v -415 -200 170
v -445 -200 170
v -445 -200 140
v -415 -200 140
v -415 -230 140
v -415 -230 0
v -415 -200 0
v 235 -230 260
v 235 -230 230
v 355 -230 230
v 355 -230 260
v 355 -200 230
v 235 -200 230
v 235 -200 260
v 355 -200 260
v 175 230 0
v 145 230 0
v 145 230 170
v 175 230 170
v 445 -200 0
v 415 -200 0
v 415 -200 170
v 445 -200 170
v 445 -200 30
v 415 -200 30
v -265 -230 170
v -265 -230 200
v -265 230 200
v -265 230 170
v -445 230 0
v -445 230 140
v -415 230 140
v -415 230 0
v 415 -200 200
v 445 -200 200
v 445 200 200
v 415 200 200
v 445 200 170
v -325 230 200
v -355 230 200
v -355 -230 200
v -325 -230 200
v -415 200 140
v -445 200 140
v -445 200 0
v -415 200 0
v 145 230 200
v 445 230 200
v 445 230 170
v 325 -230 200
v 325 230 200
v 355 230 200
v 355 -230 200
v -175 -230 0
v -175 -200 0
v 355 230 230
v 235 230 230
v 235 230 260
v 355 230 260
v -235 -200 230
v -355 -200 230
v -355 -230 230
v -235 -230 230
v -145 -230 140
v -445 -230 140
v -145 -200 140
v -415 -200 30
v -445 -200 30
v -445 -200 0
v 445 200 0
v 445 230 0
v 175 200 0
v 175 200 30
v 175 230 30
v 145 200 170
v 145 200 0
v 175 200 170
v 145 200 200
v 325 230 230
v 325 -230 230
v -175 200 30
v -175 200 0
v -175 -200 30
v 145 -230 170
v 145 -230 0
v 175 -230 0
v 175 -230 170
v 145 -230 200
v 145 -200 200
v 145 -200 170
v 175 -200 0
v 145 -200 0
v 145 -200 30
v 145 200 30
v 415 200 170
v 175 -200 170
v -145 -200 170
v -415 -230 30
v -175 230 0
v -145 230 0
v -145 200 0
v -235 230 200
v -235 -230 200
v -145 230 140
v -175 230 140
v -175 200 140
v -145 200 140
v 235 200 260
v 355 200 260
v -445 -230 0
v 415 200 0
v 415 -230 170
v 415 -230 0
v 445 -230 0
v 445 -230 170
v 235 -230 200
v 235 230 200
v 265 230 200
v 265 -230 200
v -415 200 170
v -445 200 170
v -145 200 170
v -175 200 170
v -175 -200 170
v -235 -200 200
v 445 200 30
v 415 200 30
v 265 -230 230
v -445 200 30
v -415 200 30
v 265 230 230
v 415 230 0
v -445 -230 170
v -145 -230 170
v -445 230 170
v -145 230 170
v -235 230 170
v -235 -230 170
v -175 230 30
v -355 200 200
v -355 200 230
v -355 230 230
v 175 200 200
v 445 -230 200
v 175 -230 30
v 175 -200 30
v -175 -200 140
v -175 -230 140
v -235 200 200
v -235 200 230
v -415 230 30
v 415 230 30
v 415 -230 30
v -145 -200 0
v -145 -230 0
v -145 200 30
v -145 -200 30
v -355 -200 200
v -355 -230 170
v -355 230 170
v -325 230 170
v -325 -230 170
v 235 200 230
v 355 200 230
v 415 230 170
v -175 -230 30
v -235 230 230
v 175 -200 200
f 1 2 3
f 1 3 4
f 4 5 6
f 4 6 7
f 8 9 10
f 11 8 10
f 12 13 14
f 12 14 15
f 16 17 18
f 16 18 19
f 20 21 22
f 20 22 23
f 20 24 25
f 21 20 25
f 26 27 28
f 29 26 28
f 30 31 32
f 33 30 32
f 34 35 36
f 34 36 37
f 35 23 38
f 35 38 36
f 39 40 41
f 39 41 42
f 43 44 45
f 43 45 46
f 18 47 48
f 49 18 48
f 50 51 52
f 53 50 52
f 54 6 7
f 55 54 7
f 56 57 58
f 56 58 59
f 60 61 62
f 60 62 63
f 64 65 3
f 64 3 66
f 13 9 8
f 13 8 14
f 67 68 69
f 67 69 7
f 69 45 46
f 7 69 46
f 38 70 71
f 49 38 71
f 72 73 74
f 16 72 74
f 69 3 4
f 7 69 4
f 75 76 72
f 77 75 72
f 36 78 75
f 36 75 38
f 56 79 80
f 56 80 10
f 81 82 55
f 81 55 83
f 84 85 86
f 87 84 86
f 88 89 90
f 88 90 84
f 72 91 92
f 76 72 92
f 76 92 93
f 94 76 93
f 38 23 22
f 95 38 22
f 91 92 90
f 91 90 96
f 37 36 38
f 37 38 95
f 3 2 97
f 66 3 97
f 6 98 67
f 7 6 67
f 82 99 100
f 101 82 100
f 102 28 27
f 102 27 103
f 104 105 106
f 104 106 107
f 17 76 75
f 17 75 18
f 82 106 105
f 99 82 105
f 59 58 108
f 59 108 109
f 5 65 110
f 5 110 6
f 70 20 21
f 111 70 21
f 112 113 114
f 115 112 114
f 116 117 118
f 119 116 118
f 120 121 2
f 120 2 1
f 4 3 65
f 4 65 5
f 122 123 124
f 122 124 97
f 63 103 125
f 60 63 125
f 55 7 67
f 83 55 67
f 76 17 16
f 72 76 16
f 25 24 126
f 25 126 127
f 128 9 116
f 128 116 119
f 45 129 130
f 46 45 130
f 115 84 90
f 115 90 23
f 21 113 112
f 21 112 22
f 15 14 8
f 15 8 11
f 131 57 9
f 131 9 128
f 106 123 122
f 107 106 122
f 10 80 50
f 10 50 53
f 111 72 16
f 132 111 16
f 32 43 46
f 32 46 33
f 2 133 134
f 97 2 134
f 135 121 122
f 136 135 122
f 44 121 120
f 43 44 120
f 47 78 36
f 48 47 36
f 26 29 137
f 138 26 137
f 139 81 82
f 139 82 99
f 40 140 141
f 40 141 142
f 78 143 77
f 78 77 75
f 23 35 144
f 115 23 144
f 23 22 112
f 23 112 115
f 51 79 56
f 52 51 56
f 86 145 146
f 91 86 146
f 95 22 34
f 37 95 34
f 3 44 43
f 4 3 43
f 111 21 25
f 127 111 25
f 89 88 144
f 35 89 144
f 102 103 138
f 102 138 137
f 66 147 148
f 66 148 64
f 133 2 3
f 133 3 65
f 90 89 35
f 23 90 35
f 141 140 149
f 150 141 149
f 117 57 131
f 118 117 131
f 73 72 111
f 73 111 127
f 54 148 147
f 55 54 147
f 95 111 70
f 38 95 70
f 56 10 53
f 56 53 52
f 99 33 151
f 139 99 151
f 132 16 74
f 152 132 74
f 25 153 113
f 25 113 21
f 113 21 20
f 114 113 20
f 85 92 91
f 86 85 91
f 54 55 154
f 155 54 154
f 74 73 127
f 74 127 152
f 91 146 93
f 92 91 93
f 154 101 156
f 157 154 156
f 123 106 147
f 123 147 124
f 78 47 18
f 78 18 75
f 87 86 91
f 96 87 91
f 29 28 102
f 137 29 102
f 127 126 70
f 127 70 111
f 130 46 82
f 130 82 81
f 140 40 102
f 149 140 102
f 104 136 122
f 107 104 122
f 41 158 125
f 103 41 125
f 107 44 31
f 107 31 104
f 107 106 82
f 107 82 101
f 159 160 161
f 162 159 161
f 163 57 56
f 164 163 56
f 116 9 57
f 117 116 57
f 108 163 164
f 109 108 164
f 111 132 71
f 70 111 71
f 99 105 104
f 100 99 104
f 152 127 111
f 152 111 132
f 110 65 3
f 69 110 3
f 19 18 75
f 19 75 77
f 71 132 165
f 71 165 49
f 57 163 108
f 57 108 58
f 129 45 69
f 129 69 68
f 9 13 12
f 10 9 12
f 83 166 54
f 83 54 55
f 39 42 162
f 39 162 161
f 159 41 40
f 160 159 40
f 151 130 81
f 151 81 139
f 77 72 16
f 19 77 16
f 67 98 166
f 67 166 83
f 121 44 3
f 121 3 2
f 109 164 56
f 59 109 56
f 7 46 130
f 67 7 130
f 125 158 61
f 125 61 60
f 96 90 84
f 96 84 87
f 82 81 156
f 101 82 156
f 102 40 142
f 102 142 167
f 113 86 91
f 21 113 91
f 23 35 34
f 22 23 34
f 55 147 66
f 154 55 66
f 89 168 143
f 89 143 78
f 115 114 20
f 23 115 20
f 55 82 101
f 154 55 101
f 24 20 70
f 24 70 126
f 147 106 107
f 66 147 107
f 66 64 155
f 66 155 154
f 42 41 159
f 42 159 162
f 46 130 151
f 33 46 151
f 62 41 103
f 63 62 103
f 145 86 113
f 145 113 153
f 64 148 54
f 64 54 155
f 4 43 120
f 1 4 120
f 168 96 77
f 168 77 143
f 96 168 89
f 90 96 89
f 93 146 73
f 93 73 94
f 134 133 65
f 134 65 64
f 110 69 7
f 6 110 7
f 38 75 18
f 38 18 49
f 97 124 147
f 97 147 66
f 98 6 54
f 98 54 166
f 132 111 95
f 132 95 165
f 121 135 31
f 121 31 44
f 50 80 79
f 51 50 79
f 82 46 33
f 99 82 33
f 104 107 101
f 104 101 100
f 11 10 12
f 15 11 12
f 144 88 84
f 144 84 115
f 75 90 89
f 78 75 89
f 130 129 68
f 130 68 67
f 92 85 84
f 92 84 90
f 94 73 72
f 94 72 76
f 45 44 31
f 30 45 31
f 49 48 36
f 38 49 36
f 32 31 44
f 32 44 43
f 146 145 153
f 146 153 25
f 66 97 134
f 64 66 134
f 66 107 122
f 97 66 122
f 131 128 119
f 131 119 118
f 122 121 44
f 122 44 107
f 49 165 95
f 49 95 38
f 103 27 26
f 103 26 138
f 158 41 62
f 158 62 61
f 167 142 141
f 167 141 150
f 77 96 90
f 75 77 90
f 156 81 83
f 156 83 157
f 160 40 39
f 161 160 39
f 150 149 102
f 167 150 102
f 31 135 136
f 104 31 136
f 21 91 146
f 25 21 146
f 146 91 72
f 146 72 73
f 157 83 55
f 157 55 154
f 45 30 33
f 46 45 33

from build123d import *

# Parameters (mm, degrees)
F1_W      = 30
F1_H      = 460
F2_DEPTH  = 30
F4_W      = 300
F4_H      = 30
F5_DEPTH  = 30
F6_W      = 30
F6_H      = 30
F7_DEPTH  = 140
F8_W      = 30
F8_H      = 30
F9_DEPTH  = 240
F10_W     = 30
F10_H     = 30
F11_DEPTH = 400
F12_W     = 120
F12_H     = 30
F13_DEPTH = 30
F14_W     = 300
F14_H     = 30
F15_DEPTH = 30
F16_W     = 30
F16_H     = 30
F17_DEPTH = 170
F18_W     = 30
F18_H     = 30
F19_DEPTH = 240
F20_W     = 30
F20_H     = 30
F21_DEPTH = 400
F22_W     = 120
F22_H     = 30
F23_DEPTH = 30


with BuildPart() as f2:
    # F1 (on offset) → F2 (new body)
    with BuildSketch(Plane.XY.offset(200)):
        with Locations((-250, 0)):
            Rectangle(F1_W, F1_H)
    extrude(amount=-F2_DEPTH)


with BuildPart() as f2b:
    # F1 (on offset) → F2, piece 2 (new body)
    with BuildSketch(Plane.XY.offset(200)):
        with Locations((-340, 0)):
            Rectangle(F1_W, F1_H)
    extrude(amount=-F2_DEPTH)


with BuildPart() as f2c:
    # F1 (on offset) → F2, piece 3 (new body)
    with BuildSketch(Plane.XY.offset(200)):
        with Locations((250, 0)):
            Rectangle(F1_W, F1_H)
    extrude(amount=-F2_DEPTH)


with BuildPart() as f2d:
    # F1 (on offset) → F2, piece 4 (new body)
    with BuildSketch(Plane.XY.offset(200)):
        with Locations((340, 0)):
            Rectangle(F1_W, F1_H)
    extrude(amount=-F2_DEPTH)


with BuildPart() as f2c_1:
    # F3: moved
    add(f2c.part.moved(Location((0, 0, 30))))


with BuildPart() as f2d_1:
    # F3: moved
    add(f2d.part.moved(Location((0, 0, 30))))


with BuildPart() as f5:
    # F4 (on face) → F5 (new body)
    with BuildSketch(Plane(origin=(0, 0, 170), x_dir=(1, 0, 0), z_dir=(0, 0, -1))):
        with Locations((-295, 215)):
            Rectangle(F4_W, F4_H)
    extrude(amount=F5_DEPTH)


with BuildPart() as f5b:
    # F4 (on face) → F5, piece 2 (new body)
    with BuildSketch(Plane(origin=(0, 0, 170), x_dir=(1, 0, 0), z_dir=(0, 0, -1))):
        with Locations((-295, -215)):
            Rectangle(F4_W, F4_H)
    extrude(amount=F5_DEPTH)


with BuildPart() as f7:
    # F6 (on Top) → F7 (new body, through all)
    with BuildSketch(Plane.XY):
        with Locations((-160, -215)):
            Rectangle(F6_W, F6_H)
    extrude(amount=F7_DEPTH)


with BuildPart() as f7b:
    # F6 (on Top) → F7, piece 2 (new body, through all)
    with BuildSketch(Plane.XY):
        with Locations((-160, 215)):
            Rectangle(F6_W, F6_H)
    extrude(amount=F7_DEPTH)


with BuildPart() as f7c:
    # F6 (on Top) → F7, piece 3 (new body, through all)
    with BuildSketch(Plane.XY):
        with Locations((-430, -215)):
            Rectangle(F6_W, F6_H)
    extrude(amount=F7_DEPTH)


with BuildPart() as f7d:
    # F6 (on Top) → F7, piece 4 (new body, through all)
    with BuildSketch(Plane.XY):
        with Locations((-430, 215)):
            Rectangle(F6_W, F6_H)
    extrude(amount=F7_DEPTH)


with BuildPart() as f9:
    # F8 (on face) → F9 (new body, through all)
    with BuildSketch(Plane.YZ.offset(-415)):
        with Locations((-215, 15)):
            Rectangle(F8_W, F8_H)
    extrude(amount=F9_DEPTH)


with BuildPart() as f9b:
    # F8 (on face) → F9, piece 2 (new body, through all)
    with BuildSketch(Plane.YZ.offset(-415)):
        with Locations((215, 15)):
            Rectangle(F8_W, F8_H)
    extrude(amount=F9_DEPTH)


with BuildPart() as f11:
    # F10 (on face) → F11 (new body, through all)
    with BuildSketch(Plane.XZ.offset(-200)):
        with Locations((-430, 15)):
            Rectangle(F10_W, F10_H)
    extrude(amount=F11_DEPTH)


with BuildPart() as f11b:
    # F10 (on face) → F11, piece 2 (new body, through all)
    with BuildSketch(Plane.XZ.offset(-200)):
        with Locations((-160, 15)):
            Rectangle(F10_W, F10_H)
    extrude(amount=F11_DEPTH)


with BuildPart() as f11c:
    # F10 (on face) → F11, piece 3 (new body, through all)
    with BuildSketch(Plane.XZ.offset(-200)):
        with Locations((-430, 155)):
            Rectangle(F10_W, F10_H)
    extrude(amount=F11_DEPTH)


with BuildPart() as f11d:
    # F10 (on face) → F11, piece 4 (new body, through all)
    with BuildSketch(Plane.XZ.offset(-200)):
        with Locations((-160, 155)):
            Rectangle(F10_W, F10_H)
    extrude(amount=F11_DEPTH)


with BuildPart() as f13:
    # F12 (on face) → F13 (new body)
    with BuildSketch(Plane.XY.offset(200)):
        with Locations((-295, -215)):
            Rectangle(F12_W, F12_H)
    extrude(amount=F13_DEPTH)


with BuildPart() as f13b:
    # F12 (on face) → F13, piece 2 (new body)
    with BuildSketch(Plane.XY.offset(200)):
        with Locations((-295, 215)):
            Rectangle(F12_W, F12_H)
    extrude(amount=F13_DEPTH)


with BuildPart() as f15:
    # F14 (on face) → F15 (new body)
    with BuildSketch(Plane(origin=(0, 0, 200), x_dir=(1, 0, 0), z_dir=(0, 0, -1))):
        with Locations((295, 215)):
            Rectangle(F14_W, F14_H)
    extrude(amount=F15_DEPTH)


with BuildPart() as f15b:
    # F14 (on face) → F15, piece 2 (new body)
    with BuildSketch(Plane(origin=(0, 0, 200), x_dir=(1, 0, 0), z_dir=(0, 0, -1))):
        with Locations((295, -215)):
            Rectangle(F14_W, F14_H)
    extrude(amount=F15_DEPTH)


with BuildPart() as f17:
    # F16 (on Top) → F17 (new body, through all)
    with BuildSketch(Plane.XY):
        with Locations((160, -215)):
            Rectangle(F16_W, F16_H)
    extrude(amount=F17_DEPTH)


with BuildPart() as f17b:
    # F16 (on Top) → F17, piece 2 (new body, through all)
    with BuildSketch(Plane.XY):
        with Locations((430, -215)):
            Rectangle(F16_W, F16_H)
    extrude(amount=F17_DEPTH)


with BuildPart() as f17c:
    # F16 (on Top) → F17, piece 3 (new body, through all)
    with BuildSketch(Plane.XY):
        with Locations((430, 215)):
            Rectangle(F16_W, F16_H)
    extrude(amount=F17_DEPTH)


with BuildPart() as f17d:
    # F16 (on Top) → F17, piece 4 (new body, through all)
    with BuildSketch(Plane.XY):
        with Locations((160, 215)):
            Rectangle(F16_W, F16_H)
    extrude(amount=F17_DEPTH)


with BuildPart() as f19:
    # F18 (on face) → F19 (new body, through all)
    with BuildSketch(Plane.YZ.offset(175)):
        with Locations((-215, 15)):
            Rectangle(F18_W, F18_H)
    extrude(amount=F19_DEPTH)


with BuildPart() as f19b:
    # F18 (on face) → F19, piece 2 (new body, through all)
    with BuildSketch(Plane.YZ.offset(175)):
        with Locations((215, 15)):
            Rectangle(F18_W, F18_H)
    extrude(amount=F19_DEPTH)


with BuildPart() as f21:
    # F20 (on face) → F21 (new body, through all)
    with BuildSketch(Plane(origin=(0, -200, 0), x_dir=(-1, 0, 0), z_dir=(0, 1, 0))):
        with Locations((-160, 15)):
            Rectangle(F20_W, F20_H)
    extrude(amount=F21_DEPTH)


with BuildPart() as f21b:
    # F20 (on face) → F21, piece 2 (new body, through all)
    with BuildSketch(Plane(origin=(0, -200, 0), x_dir=(-1, 0, 0), z_dir=(0, 1, 0))):
        with Locations((-430, 15)):
            Rectangle(F20_W, F20_H)
    extrude(amount=F21_DEPTH)


with BuildPart() as f21c:
    # F20 (on face) → F21, piece 3 (new body, through all)
    with BuildSketch(Plane(origin=(0, -200, 0), x_dir=(-1, 0, 0), z_dir=(0, 1, 0))):
        with Locations((-430, 185)):
            Rectangle(F20_W, F20_H)
    extrude(amount=F21_DEPTH)


with BuildPart() as f21d:
    # F20 (on face) → F21, piece 4 (new body, through all)
    with BuildSketch(Plane(origin=(0, -200, 0), x_dir=(-1, 0, 0), z_dir=(0, 1, 0))):
        with Locations((-160, 185)):
            Rectangle(F20_W, F20_H)
    extrude(amount=F21_DEPTH)


with BuildPart() as f23:
    # F22 (on face) → F23 (new body)
    with BuildSketch(Plane.XY.offset(230)):
        with Locations((295, 215)):
            Rectangle(F22_W, F22_H)
    extrude(amount=F23_DEPTH)


with BuildPart() as f23b:
    # F22 (on face) → F23, piece 2 (new body)
    with BuildSketch(Plane.XY.offset(230)):
        with Locations((295, -215)):
            Rectangle(F22_W, F22_H)
    extrude(amount=F23_DEPTH)


solid = Compound([f2.part, f2b.part, f2c_1.part, f2d_1.part, f5.part, f5b.part, f7.part, f7b.part, f7c.part, f7d.part, f9.part, f9b.part, f11.part, f11b.part, f11c.part, f11d.part, f13.part, f13b.part, f15.part, f15b.part, f17.part, f17b.part, f17c.part, f17d.part, f19.part, f19b.part, f21.part, f21b.part, f21c.part, f21d.part, f23.part, f23b.part])
